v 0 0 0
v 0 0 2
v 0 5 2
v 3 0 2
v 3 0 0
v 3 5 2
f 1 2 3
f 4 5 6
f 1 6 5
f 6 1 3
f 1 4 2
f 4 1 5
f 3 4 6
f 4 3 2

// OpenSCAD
//Draw a prism based on a 
//right angled triangle
//l - length of prism
//w - width of triangle
//h - height of triangle
module prism(l, w, h) {
       polyhedron(points=[
               [0,l,h],           // 0    front top corner
               [0,0,0],[0,0,h],   // 1, 2 front left & right bottom corners
               [w,l,h],           // 3    back top corner
               [w,0,0],[w,0,h]    // 4, 5 back left & right bottom corners
       ], faces=[ // points for all faces must be ordered clockwise when looking in
               [0,2,1],    // top face
               [3,4,5],    // base face
               [0,1,4,3],  // h face
               [1,2,5,4],  // w face
               [0,3,5,2],  // hypotenuse face
       ]);
}

prism(5, 3, 2);
